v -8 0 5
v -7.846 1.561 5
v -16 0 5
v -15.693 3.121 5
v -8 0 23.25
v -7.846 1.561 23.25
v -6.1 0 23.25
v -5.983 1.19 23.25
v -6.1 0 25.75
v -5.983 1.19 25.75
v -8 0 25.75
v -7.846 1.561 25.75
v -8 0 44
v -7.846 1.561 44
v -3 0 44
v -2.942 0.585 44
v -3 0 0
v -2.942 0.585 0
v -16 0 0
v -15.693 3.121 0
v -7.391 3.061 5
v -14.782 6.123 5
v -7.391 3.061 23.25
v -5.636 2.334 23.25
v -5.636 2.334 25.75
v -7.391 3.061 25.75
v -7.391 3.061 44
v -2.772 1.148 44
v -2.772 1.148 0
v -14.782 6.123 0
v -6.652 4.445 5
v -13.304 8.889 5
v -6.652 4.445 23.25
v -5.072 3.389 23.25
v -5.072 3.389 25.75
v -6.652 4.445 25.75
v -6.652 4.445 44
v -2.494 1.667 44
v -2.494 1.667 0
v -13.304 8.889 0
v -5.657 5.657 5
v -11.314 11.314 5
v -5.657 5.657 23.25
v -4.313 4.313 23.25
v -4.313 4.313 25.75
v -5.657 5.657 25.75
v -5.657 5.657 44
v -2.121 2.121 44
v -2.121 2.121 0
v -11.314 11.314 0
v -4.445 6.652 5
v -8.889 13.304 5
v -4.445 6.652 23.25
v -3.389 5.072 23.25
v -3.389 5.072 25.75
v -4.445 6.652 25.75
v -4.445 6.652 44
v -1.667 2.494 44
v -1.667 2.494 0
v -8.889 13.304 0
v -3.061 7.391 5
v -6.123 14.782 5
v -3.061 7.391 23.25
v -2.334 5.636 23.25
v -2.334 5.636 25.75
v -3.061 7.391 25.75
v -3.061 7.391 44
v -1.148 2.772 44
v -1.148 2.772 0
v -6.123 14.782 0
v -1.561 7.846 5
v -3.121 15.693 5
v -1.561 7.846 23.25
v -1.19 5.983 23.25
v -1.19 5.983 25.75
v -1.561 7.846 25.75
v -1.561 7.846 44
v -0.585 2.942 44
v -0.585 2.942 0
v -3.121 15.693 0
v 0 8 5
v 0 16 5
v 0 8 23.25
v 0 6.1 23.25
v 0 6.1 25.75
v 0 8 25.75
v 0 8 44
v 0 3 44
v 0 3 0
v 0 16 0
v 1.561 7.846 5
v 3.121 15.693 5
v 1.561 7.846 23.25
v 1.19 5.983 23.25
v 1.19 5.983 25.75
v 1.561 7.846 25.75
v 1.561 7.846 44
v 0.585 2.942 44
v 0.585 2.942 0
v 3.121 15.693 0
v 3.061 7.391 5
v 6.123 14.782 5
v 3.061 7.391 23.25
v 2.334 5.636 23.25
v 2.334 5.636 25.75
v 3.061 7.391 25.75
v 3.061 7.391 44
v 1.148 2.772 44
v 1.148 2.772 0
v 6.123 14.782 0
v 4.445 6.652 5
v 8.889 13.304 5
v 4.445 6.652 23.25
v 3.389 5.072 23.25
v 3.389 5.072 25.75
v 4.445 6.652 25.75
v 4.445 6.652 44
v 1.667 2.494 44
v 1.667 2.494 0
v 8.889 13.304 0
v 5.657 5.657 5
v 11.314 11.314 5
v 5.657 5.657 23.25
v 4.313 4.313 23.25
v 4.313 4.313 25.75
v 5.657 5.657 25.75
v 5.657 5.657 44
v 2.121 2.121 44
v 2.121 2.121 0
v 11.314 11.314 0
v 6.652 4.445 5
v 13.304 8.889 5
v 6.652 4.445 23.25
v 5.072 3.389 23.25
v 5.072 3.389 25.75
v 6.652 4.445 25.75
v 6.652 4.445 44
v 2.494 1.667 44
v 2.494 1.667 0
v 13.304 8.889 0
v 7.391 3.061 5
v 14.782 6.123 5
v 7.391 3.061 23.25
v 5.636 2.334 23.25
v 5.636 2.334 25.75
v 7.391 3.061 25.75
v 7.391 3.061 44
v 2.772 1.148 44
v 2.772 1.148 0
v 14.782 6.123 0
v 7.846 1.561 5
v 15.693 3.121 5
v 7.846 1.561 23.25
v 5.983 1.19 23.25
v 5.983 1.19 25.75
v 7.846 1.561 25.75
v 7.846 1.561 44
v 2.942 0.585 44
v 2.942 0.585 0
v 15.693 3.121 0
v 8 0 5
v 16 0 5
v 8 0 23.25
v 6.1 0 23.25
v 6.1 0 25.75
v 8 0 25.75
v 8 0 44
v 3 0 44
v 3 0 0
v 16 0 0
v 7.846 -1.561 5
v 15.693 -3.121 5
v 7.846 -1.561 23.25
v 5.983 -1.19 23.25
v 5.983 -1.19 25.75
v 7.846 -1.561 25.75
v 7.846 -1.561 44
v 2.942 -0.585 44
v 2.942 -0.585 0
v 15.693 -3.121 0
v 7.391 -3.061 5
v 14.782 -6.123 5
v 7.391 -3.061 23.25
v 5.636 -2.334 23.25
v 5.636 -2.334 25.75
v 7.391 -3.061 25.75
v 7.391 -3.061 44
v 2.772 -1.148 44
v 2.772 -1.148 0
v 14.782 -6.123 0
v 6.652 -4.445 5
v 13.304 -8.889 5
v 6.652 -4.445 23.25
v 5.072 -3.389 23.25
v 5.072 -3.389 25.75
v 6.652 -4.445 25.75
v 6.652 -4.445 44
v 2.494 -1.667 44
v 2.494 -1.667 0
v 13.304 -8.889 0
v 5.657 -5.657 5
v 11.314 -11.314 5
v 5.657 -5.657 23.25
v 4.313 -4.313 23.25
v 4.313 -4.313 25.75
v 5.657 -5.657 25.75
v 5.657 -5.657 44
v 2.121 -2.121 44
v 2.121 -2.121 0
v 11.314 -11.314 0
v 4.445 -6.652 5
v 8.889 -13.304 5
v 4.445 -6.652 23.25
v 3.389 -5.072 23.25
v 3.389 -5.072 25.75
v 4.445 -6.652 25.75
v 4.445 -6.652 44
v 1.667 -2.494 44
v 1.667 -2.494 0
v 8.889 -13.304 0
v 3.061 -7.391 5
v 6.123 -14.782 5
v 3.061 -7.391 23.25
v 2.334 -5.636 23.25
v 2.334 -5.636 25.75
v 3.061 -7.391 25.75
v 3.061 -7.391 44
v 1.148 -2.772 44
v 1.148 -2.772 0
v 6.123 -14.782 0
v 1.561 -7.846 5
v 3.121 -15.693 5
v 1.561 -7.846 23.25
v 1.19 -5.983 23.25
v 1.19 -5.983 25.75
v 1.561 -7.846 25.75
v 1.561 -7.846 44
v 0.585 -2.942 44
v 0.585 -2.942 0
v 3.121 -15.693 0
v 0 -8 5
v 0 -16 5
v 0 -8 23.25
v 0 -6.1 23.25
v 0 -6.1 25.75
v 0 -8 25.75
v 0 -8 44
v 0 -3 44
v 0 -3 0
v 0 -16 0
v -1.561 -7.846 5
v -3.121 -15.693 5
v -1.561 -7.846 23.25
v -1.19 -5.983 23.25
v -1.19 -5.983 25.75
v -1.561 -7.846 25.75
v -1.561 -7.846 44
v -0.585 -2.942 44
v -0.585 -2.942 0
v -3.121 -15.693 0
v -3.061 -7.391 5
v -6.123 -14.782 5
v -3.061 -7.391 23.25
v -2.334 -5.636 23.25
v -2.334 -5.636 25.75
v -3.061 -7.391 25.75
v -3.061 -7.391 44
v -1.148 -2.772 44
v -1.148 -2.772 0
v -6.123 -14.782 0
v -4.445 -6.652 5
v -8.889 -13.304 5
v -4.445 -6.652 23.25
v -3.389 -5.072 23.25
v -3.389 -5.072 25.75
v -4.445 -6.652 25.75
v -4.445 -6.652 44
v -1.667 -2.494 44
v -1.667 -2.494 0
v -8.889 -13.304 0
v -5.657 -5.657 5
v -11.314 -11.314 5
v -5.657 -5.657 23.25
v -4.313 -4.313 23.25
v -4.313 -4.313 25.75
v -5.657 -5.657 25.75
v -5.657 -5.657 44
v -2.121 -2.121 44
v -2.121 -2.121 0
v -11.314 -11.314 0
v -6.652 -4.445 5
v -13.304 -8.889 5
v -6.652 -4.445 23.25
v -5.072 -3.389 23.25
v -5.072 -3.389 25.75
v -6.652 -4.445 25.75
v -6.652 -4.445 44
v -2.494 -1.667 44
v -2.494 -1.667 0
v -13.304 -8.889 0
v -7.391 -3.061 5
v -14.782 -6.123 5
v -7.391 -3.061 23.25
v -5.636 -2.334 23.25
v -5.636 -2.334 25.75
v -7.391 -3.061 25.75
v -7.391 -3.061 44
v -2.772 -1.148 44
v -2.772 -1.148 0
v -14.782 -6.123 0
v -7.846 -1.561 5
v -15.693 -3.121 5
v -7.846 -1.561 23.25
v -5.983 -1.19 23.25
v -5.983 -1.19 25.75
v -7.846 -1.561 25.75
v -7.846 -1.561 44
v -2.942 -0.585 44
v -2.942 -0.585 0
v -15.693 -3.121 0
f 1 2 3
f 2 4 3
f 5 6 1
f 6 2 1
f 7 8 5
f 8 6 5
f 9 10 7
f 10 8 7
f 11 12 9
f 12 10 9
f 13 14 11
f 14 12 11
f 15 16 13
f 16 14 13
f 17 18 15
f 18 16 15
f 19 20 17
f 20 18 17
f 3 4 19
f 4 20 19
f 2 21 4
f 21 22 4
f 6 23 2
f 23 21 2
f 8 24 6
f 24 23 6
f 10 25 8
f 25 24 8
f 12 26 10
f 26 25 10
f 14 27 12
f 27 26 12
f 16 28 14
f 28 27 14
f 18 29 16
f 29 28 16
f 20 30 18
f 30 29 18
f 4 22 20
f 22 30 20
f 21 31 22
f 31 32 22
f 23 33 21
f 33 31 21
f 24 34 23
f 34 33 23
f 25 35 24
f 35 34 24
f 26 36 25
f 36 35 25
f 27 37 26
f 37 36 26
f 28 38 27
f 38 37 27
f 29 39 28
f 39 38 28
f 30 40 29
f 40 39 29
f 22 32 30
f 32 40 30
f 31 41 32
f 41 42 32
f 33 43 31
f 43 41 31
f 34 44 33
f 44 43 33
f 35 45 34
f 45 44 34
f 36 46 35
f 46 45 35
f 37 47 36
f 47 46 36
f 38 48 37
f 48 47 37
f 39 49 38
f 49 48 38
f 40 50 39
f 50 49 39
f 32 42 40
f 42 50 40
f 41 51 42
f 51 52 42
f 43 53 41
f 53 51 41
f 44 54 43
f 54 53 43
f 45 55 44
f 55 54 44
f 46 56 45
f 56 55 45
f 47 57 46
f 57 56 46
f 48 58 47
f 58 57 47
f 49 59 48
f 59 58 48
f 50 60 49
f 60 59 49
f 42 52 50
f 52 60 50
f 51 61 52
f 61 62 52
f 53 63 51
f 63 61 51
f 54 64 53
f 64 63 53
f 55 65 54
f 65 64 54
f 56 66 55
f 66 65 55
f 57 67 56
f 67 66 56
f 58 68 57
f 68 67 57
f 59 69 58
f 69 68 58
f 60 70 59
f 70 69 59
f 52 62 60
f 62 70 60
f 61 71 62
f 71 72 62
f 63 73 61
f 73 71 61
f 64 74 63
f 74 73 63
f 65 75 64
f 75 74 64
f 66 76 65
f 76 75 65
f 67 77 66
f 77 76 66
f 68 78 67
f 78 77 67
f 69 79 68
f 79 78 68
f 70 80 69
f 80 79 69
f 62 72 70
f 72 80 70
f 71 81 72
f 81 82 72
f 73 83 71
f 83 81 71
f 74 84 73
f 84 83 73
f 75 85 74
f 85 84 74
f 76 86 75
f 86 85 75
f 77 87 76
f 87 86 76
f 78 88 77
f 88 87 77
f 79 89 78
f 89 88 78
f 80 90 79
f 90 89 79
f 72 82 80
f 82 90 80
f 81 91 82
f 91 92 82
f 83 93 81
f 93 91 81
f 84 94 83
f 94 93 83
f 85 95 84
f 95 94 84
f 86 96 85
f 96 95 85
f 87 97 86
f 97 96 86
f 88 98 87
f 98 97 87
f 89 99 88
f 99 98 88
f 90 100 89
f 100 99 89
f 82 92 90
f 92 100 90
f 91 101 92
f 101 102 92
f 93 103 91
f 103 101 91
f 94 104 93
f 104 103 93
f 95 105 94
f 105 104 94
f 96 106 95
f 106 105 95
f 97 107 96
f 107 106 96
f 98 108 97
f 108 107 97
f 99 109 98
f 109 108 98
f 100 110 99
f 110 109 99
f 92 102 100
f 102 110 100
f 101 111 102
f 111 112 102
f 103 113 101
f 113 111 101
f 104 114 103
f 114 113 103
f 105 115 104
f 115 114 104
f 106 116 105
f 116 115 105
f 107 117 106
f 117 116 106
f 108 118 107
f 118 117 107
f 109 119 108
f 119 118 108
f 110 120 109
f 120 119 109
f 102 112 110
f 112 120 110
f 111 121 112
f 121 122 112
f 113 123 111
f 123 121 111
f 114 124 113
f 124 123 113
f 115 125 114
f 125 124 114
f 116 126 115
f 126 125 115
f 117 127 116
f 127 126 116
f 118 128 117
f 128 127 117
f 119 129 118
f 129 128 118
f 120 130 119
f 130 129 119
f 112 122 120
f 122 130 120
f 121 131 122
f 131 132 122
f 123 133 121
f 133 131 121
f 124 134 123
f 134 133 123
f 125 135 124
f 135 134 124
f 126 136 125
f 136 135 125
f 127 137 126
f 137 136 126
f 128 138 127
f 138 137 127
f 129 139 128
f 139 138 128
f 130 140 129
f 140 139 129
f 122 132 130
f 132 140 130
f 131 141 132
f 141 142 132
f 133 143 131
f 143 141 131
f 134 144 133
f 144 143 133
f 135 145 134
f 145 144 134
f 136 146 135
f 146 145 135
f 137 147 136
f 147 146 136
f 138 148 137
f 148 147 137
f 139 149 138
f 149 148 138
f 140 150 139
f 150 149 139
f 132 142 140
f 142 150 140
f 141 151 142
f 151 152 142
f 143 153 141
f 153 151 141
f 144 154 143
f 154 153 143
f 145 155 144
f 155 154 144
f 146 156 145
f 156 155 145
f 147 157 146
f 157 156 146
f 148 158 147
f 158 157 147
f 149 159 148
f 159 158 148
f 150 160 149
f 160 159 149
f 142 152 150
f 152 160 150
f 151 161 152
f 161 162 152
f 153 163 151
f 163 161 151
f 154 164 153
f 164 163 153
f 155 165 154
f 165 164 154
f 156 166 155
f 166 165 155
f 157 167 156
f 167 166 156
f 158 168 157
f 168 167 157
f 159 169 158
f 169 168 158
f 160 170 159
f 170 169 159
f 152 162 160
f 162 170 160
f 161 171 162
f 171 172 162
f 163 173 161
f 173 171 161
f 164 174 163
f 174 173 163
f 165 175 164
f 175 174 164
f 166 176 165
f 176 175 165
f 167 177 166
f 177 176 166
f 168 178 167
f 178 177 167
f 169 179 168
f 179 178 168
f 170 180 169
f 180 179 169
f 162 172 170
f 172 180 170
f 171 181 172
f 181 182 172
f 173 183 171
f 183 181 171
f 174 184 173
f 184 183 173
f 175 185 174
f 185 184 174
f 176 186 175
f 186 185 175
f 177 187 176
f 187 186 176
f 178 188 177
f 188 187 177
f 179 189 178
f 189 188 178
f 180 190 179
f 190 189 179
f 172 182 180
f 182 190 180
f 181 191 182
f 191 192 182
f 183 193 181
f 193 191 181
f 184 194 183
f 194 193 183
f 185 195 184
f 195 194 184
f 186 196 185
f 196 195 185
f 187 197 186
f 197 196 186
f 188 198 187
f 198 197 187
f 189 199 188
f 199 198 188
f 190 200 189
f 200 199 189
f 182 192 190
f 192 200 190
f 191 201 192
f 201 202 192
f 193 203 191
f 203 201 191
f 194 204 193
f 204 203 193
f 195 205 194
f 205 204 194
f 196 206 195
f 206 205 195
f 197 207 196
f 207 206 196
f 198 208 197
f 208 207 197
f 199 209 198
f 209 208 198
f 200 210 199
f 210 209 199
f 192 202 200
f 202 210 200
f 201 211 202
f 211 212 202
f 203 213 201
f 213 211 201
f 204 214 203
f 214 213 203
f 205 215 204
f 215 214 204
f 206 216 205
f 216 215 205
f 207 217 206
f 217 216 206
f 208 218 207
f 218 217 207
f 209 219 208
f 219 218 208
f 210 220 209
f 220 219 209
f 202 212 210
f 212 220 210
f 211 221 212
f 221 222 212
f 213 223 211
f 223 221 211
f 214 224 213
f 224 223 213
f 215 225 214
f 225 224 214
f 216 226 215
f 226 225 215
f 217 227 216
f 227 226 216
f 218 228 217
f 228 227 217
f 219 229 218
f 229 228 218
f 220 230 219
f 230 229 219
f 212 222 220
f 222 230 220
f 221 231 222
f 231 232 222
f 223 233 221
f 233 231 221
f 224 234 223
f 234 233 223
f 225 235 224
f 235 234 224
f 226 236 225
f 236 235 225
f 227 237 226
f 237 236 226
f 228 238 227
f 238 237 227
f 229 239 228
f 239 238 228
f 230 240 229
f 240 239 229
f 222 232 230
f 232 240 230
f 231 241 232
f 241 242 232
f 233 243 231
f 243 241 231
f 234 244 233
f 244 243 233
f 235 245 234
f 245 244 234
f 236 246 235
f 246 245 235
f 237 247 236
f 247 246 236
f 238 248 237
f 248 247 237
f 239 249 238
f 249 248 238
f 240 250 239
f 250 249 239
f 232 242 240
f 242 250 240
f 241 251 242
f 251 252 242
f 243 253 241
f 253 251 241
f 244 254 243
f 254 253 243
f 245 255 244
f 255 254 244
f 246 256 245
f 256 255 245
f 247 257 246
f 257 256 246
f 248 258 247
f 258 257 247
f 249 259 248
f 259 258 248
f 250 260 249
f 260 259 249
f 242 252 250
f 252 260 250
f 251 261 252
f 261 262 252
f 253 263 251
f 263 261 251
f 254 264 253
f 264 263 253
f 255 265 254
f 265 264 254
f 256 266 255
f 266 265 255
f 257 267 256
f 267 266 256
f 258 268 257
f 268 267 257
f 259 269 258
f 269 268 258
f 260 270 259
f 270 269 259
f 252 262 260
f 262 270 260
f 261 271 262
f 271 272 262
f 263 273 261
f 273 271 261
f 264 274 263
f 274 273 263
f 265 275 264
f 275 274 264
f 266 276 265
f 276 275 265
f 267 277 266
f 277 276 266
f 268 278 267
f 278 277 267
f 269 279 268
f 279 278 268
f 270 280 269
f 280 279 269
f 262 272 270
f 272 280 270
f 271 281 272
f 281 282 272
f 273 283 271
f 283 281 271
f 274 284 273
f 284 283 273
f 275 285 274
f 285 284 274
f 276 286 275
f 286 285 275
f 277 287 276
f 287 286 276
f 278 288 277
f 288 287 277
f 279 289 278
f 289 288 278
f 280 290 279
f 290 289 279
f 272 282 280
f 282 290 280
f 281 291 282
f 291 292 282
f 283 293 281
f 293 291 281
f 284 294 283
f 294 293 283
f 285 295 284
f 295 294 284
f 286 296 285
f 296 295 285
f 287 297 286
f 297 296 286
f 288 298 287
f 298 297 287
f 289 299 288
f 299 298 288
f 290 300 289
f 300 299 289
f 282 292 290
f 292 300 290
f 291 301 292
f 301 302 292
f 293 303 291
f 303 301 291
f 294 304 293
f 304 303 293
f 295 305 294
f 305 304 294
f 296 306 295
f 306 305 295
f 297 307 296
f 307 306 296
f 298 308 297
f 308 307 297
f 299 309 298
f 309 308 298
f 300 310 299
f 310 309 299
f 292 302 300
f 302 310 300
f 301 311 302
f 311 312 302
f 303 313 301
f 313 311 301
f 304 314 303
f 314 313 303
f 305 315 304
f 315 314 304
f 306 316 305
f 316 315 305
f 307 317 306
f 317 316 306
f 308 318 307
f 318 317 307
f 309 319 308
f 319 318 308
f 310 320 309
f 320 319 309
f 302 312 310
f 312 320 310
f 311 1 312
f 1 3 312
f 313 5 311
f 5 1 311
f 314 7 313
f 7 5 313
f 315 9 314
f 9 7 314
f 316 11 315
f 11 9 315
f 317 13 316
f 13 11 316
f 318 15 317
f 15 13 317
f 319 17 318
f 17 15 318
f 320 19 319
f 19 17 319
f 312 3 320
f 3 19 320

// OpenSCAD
$fn = 32;

// ----------------------------------------------------------------------
// Grooved revolve: flanged, bore R3
// ----------------------------------------------------------------------

// --- parameters (mm) ---
bore_r = 3;               // bore radius
outer_r = 8;              // outer radius of the body
total_h = 44;             // overall height, Z
wall = 5;                 // radial wall thickness
groove_w = 2.5;           // groove width
groove_d = 1.9;           // groove depth
grooves = 1;              // number of outer grooves
flange_r = 16;            // flange radius
flange_h = 5;             // flange height

bbox_x = 2 * flange_r;  // full diameter
bore_d = 2 * bore_r;  // bore diameter
body_d = 2 * outer_r;  // body diameter
flange_d = 2 * flange_r;  // flange diameter
revolve_angle = 360;  // full turn around the Z axis

profile = [[3, 0], [8, 0], [16, 0], [16, 5], [8, 5], [8, 23.25], [6.1, 23.25], [6.1, 25.75], [8, 25.75], [8, 44], [3, 44]];  // primary outline, 11 points, counter clockwise

// --- the one profile operation ---
rotate_extrude(angle = revolve_angle) polygon(points = profile);
